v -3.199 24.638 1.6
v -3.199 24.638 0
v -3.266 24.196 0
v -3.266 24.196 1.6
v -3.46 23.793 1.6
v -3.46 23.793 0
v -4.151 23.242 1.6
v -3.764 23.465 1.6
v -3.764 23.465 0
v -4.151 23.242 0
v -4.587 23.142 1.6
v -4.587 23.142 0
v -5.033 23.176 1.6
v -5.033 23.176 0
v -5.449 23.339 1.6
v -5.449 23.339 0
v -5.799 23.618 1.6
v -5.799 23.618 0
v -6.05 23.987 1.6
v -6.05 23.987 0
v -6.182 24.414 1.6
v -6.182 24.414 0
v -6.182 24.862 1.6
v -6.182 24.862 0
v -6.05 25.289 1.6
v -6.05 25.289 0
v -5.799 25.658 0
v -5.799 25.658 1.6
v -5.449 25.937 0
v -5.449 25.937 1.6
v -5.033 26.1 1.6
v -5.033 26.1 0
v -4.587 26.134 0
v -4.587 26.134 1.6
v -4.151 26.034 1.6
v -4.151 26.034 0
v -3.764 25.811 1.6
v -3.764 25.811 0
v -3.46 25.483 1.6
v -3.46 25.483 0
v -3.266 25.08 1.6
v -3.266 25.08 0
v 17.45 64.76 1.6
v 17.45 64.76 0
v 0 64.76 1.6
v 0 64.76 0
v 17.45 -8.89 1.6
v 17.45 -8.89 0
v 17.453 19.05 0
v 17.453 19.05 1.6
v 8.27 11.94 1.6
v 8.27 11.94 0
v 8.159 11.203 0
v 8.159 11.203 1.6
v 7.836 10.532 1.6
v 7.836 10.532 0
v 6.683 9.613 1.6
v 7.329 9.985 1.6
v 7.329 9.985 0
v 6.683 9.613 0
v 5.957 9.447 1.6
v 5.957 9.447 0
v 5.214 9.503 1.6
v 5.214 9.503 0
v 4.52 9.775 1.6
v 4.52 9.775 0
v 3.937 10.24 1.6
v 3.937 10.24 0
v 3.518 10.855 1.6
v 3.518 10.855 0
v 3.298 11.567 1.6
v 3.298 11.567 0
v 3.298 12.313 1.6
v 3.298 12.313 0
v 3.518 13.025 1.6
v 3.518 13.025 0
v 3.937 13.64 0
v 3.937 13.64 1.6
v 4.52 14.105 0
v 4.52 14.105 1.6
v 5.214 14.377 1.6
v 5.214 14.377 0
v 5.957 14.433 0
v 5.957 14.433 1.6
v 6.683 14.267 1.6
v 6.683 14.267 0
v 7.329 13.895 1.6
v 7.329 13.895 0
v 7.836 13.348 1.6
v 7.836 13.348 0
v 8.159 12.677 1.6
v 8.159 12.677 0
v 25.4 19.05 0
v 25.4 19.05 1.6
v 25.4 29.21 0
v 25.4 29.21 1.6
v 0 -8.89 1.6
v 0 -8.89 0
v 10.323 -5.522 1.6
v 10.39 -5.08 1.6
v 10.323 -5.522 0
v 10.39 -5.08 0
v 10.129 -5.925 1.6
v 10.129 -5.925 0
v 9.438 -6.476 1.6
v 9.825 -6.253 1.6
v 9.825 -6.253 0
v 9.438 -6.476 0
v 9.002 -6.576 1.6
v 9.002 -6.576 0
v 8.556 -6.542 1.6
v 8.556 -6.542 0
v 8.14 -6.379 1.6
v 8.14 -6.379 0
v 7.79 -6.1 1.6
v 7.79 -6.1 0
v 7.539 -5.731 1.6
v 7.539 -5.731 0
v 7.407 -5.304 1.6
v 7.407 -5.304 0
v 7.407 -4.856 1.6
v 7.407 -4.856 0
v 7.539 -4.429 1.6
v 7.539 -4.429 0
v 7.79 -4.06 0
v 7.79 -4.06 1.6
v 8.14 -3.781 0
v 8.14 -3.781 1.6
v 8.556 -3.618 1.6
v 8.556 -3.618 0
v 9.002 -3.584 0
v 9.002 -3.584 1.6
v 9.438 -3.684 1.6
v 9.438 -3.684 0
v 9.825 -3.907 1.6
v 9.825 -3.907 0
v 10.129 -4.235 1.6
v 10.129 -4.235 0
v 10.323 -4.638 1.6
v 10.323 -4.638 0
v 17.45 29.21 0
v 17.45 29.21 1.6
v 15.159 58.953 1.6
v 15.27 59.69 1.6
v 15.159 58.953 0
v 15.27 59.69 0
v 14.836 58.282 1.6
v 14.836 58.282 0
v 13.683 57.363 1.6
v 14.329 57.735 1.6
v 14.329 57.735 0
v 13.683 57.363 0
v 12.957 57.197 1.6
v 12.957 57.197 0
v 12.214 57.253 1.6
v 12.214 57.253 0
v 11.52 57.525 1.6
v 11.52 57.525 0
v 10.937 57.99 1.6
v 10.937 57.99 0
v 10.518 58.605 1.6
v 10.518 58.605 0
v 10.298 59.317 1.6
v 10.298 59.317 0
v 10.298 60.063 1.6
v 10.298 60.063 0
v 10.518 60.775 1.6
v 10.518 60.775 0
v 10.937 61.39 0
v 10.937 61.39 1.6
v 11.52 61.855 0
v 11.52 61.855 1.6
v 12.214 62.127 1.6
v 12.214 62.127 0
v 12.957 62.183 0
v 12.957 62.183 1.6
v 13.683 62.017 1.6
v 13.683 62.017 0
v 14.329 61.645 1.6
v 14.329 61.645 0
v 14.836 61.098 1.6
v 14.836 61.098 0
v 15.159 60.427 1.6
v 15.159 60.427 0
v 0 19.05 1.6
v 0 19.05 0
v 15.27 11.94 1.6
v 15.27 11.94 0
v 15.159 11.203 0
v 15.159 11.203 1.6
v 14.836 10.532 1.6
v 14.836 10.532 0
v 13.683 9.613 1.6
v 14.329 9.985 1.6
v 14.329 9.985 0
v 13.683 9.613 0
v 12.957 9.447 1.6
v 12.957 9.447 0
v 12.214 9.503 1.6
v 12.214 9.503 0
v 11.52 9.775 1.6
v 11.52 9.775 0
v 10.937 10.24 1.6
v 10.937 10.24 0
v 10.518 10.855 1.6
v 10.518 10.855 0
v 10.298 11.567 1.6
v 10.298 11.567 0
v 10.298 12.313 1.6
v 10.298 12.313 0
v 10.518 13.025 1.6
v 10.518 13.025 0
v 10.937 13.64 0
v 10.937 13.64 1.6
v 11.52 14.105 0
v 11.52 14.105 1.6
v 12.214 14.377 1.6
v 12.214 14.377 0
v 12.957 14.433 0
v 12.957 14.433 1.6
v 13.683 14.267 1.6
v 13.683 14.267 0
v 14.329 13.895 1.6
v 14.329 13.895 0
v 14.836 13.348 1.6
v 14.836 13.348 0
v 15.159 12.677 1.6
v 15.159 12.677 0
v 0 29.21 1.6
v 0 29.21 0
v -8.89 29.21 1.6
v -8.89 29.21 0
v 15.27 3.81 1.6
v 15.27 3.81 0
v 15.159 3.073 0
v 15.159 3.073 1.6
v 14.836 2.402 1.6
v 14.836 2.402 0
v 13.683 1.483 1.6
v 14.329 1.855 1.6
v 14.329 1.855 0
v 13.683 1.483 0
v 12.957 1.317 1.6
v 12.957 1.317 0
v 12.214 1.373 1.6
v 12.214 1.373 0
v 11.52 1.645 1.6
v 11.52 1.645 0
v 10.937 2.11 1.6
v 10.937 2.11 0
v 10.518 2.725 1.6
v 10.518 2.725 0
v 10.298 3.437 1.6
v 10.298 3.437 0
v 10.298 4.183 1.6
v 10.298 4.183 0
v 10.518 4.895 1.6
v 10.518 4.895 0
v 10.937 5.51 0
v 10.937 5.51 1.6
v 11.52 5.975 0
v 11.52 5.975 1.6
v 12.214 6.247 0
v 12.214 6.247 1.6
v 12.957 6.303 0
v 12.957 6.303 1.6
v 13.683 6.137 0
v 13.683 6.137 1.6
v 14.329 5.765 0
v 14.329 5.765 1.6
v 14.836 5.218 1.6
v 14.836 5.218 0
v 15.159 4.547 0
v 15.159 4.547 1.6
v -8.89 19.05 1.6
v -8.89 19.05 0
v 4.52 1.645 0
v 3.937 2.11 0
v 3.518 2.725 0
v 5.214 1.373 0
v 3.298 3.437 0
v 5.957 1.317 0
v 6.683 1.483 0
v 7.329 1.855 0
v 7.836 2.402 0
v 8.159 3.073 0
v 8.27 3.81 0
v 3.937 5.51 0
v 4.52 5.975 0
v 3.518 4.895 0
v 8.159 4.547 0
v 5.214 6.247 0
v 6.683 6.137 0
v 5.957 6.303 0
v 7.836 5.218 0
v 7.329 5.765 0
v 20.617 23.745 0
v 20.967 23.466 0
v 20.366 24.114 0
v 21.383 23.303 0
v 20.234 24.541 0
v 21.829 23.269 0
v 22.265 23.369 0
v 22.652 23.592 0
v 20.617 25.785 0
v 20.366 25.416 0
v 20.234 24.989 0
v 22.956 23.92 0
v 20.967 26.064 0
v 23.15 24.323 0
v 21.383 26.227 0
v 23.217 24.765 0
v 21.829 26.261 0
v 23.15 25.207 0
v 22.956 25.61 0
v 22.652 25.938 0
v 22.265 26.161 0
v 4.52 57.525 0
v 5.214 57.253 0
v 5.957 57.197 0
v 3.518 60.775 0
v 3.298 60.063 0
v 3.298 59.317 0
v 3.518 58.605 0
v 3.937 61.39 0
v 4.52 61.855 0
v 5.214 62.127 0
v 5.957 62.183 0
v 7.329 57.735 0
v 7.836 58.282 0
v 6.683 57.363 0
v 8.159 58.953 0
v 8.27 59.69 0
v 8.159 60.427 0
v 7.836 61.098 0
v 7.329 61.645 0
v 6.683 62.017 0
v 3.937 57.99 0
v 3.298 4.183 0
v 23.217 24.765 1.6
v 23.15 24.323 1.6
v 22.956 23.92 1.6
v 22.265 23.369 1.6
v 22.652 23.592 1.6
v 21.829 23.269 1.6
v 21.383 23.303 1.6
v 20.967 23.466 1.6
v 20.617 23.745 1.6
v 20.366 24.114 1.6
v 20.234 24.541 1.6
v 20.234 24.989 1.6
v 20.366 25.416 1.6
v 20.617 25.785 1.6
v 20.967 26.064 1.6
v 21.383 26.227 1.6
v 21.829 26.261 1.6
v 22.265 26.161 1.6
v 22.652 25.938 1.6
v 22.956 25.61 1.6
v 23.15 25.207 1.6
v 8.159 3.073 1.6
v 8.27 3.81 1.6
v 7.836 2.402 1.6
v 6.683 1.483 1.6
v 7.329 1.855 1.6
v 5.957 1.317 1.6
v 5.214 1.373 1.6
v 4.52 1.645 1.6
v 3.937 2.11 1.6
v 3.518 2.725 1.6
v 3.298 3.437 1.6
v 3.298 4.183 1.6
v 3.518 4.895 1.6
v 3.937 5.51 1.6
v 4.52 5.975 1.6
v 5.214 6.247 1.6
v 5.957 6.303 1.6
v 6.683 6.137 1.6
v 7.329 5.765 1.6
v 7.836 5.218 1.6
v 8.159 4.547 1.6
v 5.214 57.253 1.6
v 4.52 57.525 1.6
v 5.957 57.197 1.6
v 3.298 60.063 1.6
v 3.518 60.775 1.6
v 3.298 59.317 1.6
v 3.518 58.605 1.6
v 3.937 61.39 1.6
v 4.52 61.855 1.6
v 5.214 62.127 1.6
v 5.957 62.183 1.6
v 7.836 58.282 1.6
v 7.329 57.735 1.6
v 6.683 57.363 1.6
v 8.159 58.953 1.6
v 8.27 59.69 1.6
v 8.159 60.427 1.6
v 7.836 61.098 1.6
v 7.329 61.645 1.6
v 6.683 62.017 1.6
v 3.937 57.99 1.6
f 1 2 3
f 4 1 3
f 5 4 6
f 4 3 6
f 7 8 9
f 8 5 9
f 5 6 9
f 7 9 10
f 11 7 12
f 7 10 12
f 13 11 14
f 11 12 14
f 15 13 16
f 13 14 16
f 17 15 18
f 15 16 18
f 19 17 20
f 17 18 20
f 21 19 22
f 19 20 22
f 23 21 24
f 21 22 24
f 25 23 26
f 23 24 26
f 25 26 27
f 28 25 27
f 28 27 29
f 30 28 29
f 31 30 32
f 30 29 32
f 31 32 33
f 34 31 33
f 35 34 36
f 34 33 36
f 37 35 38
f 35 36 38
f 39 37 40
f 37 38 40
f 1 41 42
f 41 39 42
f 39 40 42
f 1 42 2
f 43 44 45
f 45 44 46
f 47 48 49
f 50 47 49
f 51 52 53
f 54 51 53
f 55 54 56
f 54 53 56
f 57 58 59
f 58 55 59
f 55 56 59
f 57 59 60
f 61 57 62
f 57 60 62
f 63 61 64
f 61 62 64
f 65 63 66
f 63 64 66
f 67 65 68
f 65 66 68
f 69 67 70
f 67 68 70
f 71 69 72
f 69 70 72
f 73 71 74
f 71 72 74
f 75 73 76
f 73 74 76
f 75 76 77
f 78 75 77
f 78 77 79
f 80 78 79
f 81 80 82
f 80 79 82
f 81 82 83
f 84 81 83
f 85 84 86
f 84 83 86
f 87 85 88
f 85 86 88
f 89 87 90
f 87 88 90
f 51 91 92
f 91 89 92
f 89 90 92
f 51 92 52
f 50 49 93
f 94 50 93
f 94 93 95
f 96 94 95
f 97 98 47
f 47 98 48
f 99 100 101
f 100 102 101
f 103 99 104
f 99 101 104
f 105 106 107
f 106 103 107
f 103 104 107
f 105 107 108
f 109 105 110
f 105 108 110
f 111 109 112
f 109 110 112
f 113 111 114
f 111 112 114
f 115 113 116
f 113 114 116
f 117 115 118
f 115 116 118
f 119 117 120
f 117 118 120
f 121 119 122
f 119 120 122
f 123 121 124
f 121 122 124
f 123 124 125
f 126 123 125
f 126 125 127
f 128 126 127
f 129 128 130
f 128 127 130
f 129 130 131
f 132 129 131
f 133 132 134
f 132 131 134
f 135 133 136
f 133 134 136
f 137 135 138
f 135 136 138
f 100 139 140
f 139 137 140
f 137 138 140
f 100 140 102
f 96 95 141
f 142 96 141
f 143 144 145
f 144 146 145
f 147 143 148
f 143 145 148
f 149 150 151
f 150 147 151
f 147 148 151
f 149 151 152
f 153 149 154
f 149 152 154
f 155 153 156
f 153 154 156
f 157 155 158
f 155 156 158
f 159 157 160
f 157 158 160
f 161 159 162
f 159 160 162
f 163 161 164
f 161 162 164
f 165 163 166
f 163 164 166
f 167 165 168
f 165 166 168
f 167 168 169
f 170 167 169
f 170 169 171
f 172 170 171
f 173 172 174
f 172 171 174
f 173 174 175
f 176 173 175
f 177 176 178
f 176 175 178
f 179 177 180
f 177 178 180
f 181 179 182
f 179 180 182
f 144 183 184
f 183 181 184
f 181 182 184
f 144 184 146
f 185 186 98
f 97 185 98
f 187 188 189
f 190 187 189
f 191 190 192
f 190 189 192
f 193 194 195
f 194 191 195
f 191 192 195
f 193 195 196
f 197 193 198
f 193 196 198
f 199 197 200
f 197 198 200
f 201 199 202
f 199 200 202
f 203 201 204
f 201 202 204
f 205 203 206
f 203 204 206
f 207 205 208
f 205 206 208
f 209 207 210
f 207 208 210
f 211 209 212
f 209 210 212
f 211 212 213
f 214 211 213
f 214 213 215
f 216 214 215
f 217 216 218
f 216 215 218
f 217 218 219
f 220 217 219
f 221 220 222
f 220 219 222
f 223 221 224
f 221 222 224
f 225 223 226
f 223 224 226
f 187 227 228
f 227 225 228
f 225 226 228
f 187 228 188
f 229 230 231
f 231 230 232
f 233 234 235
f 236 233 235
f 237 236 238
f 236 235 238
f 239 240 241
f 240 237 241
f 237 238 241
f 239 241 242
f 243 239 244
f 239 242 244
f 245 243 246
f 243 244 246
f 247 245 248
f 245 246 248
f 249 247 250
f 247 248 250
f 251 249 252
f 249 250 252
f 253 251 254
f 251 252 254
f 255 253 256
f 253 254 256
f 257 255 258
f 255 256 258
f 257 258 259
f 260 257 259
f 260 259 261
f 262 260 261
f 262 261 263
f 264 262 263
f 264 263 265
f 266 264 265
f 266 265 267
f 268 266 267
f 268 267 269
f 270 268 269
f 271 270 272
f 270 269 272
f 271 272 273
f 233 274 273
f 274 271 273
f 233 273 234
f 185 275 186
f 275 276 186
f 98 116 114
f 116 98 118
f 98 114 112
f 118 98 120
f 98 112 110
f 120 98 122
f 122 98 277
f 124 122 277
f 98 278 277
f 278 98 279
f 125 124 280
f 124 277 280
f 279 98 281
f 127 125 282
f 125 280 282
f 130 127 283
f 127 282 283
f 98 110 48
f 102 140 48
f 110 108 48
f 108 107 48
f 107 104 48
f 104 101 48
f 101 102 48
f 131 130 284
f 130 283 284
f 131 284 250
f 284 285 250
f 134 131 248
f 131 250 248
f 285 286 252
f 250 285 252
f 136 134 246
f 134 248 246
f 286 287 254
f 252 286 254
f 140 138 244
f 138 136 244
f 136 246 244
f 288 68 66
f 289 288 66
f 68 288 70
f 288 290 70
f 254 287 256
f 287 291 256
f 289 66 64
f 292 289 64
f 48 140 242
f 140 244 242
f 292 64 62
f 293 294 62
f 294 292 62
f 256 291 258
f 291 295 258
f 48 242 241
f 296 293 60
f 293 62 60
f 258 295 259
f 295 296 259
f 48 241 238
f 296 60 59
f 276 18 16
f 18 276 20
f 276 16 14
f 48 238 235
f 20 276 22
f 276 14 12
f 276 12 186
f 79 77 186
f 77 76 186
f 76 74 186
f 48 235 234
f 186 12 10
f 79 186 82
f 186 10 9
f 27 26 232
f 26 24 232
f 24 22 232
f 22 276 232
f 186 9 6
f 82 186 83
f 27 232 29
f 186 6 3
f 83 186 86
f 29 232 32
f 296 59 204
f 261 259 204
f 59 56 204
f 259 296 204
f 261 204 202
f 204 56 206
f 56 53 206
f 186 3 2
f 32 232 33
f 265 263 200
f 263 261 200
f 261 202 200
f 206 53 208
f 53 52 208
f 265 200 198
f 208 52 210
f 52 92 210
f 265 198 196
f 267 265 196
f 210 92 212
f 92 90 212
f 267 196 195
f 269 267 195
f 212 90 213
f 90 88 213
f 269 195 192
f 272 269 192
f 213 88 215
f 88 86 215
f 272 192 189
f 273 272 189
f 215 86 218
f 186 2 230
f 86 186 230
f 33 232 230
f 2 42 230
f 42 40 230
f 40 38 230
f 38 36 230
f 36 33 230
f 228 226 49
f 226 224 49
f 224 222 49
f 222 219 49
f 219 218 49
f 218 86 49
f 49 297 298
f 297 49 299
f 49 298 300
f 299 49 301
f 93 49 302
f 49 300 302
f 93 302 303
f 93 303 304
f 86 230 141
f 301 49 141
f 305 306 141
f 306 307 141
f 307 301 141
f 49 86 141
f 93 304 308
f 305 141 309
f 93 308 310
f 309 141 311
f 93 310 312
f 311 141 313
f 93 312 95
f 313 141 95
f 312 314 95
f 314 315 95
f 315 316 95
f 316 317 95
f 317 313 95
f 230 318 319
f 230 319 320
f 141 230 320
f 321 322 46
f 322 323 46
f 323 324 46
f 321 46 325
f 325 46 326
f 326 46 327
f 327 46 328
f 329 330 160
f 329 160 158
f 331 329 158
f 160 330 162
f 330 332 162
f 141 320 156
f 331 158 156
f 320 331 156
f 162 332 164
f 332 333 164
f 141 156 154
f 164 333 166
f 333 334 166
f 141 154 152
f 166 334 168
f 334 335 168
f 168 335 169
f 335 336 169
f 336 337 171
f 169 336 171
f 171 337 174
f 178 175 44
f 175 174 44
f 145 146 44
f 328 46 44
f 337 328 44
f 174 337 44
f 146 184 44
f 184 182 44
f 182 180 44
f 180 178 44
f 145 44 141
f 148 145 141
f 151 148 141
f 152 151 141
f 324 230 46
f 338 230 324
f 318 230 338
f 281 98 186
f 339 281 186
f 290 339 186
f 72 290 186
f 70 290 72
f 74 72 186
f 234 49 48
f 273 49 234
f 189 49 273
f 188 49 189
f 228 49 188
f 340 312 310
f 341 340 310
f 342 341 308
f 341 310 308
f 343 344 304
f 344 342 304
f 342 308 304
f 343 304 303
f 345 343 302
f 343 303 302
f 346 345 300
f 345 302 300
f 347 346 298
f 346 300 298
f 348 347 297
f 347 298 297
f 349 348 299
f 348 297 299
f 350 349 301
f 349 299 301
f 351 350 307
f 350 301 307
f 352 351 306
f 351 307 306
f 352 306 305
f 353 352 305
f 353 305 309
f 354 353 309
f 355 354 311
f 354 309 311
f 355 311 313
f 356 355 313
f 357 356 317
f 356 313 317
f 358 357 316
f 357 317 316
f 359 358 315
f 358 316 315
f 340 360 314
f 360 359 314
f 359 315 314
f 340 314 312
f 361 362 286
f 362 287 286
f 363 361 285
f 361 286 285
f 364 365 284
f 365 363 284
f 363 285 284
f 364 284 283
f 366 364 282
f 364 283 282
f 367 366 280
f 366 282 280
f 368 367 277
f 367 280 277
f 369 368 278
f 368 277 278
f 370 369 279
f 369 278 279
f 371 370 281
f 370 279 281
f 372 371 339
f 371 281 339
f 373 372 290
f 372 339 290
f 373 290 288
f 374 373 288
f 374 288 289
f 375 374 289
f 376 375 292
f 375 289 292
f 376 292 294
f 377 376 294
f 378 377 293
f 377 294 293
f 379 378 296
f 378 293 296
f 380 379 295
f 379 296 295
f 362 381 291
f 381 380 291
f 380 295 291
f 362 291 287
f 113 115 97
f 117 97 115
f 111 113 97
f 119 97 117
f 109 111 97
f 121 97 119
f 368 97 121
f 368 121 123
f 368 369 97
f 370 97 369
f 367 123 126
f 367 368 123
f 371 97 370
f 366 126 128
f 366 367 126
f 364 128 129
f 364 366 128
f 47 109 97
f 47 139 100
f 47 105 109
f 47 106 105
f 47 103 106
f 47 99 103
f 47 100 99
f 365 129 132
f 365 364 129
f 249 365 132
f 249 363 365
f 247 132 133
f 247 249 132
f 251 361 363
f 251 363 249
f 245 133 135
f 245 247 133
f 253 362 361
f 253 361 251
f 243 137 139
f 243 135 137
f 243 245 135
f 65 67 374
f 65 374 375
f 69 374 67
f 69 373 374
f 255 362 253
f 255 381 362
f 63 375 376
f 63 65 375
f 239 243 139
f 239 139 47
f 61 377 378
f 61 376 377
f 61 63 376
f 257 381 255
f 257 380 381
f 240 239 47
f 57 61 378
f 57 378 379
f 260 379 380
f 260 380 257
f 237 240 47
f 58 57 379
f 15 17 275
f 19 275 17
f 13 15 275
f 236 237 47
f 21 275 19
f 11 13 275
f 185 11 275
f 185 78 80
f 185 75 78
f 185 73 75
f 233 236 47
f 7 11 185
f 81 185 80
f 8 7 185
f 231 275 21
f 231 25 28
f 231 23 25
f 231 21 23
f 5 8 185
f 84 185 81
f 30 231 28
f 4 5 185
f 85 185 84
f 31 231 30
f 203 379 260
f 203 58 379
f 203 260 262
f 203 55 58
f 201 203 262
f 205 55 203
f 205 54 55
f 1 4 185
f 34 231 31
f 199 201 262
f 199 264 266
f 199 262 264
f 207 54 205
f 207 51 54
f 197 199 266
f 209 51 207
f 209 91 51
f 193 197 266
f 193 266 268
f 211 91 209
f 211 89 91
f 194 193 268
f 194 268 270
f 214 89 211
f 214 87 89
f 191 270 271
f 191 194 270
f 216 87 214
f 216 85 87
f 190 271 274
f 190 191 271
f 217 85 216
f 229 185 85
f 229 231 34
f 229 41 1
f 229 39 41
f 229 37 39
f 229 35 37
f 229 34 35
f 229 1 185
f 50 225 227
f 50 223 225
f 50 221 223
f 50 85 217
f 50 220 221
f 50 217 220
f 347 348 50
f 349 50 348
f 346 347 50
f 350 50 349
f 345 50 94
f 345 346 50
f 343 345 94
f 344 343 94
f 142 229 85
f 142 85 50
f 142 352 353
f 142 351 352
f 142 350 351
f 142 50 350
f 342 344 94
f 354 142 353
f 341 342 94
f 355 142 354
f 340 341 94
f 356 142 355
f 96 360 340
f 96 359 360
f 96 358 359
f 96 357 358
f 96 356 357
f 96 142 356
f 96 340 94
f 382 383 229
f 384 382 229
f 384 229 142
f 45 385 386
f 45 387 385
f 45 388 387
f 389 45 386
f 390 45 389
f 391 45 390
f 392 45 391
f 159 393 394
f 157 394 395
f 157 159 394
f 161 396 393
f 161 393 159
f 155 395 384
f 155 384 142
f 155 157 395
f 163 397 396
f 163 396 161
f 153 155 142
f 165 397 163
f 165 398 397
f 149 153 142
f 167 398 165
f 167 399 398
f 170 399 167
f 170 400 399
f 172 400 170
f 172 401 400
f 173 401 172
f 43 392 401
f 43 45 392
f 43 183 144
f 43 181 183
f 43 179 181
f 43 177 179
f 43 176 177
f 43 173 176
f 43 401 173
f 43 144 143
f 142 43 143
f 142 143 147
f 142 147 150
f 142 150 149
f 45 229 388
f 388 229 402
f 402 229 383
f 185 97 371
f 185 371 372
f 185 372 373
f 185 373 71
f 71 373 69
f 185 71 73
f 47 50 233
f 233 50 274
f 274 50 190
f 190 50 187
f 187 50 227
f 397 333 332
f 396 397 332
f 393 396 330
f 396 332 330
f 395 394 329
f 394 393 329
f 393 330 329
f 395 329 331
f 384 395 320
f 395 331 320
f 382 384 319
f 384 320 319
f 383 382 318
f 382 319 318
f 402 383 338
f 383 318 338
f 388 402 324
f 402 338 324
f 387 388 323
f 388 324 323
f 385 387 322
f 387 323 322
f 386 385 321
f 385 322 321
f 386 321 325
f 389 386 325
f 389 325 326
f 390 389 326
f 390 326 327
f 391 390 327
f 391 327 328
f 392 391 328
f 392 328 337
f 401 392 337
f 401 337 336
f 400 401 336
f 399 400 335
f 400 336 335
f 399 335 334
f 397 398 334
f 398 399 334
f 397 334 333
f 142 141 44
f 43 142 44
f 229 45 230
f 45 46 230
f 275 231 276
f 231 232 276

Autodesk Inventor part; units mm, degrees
ref_plane "YZ Plane" through (0, 0, 0) normal (1, 0, 0) x (0, 1, 0)
ref_plane "XZ Plane" through (0, 0, 0) normal (0, 1, 0) x (-1, 0, 0)
ref_plane "XY Plane" through (0, 0, 0) normal (0, 0, 1) x (1, 0, 0)
sketch "Эскиз1" plane through (0, 0, 0) normal (0, 0, 1) x (1, 0, 0)
  line L0 (0, -8.89) -> (17.45, -8.89)
  line L1 (17.45, -8.89) -> (17.453, 19.05)
  line L2 (17.453, 19.05) -> (25.4, 19.05)
  line L3 (25.4, 19.05) -> (25.4, 29.21)
  line L4 (25.4, 29.21) -> (17.45, 29.21)
  line L5 (17.45, 29.21) -> (17.45, 64.76)
  line L6 (17.45, 64.76) -> (0, 64.76)
  line L7 (0, 64.76) -> (0, 29.21)
  line L8 (0, 29.21) -> (-8.89, 29.21)
  line L9 (-8.89, 29.21) -> (-8.89, 19.05)
  line L10 (-8.89, 19.05) -> (0, 19.05)
  line L11 (0, 19.05) -> (0, -8.89)
  circle A0 centre (5.77, 3.81) radius 2.5
  circle A1 centre (12.77, 3.81) radius 2.5
  circle A2 centre (5.77, 11.94) radius 2.5
  circle A3 centre (12.77, 11.94) radius 2.5
  circle A4 centre (5.77, 59.69) radius 2.5
  circle A5 centre (12.77, 59.69) radius 2.5
  circle A6 centre (8.89, -5.08) radius 1.5
  circle A7 centre (-4.699, 24.638) radius 1.5
  circle A8 centre (21.717, 24.765) radius 1.5
extrude "xt60_pcb.brdКонтур" add sketch "Эскиз1" along normal blind 1.6
properties part number "xt60_pcb.brdКонтур"
